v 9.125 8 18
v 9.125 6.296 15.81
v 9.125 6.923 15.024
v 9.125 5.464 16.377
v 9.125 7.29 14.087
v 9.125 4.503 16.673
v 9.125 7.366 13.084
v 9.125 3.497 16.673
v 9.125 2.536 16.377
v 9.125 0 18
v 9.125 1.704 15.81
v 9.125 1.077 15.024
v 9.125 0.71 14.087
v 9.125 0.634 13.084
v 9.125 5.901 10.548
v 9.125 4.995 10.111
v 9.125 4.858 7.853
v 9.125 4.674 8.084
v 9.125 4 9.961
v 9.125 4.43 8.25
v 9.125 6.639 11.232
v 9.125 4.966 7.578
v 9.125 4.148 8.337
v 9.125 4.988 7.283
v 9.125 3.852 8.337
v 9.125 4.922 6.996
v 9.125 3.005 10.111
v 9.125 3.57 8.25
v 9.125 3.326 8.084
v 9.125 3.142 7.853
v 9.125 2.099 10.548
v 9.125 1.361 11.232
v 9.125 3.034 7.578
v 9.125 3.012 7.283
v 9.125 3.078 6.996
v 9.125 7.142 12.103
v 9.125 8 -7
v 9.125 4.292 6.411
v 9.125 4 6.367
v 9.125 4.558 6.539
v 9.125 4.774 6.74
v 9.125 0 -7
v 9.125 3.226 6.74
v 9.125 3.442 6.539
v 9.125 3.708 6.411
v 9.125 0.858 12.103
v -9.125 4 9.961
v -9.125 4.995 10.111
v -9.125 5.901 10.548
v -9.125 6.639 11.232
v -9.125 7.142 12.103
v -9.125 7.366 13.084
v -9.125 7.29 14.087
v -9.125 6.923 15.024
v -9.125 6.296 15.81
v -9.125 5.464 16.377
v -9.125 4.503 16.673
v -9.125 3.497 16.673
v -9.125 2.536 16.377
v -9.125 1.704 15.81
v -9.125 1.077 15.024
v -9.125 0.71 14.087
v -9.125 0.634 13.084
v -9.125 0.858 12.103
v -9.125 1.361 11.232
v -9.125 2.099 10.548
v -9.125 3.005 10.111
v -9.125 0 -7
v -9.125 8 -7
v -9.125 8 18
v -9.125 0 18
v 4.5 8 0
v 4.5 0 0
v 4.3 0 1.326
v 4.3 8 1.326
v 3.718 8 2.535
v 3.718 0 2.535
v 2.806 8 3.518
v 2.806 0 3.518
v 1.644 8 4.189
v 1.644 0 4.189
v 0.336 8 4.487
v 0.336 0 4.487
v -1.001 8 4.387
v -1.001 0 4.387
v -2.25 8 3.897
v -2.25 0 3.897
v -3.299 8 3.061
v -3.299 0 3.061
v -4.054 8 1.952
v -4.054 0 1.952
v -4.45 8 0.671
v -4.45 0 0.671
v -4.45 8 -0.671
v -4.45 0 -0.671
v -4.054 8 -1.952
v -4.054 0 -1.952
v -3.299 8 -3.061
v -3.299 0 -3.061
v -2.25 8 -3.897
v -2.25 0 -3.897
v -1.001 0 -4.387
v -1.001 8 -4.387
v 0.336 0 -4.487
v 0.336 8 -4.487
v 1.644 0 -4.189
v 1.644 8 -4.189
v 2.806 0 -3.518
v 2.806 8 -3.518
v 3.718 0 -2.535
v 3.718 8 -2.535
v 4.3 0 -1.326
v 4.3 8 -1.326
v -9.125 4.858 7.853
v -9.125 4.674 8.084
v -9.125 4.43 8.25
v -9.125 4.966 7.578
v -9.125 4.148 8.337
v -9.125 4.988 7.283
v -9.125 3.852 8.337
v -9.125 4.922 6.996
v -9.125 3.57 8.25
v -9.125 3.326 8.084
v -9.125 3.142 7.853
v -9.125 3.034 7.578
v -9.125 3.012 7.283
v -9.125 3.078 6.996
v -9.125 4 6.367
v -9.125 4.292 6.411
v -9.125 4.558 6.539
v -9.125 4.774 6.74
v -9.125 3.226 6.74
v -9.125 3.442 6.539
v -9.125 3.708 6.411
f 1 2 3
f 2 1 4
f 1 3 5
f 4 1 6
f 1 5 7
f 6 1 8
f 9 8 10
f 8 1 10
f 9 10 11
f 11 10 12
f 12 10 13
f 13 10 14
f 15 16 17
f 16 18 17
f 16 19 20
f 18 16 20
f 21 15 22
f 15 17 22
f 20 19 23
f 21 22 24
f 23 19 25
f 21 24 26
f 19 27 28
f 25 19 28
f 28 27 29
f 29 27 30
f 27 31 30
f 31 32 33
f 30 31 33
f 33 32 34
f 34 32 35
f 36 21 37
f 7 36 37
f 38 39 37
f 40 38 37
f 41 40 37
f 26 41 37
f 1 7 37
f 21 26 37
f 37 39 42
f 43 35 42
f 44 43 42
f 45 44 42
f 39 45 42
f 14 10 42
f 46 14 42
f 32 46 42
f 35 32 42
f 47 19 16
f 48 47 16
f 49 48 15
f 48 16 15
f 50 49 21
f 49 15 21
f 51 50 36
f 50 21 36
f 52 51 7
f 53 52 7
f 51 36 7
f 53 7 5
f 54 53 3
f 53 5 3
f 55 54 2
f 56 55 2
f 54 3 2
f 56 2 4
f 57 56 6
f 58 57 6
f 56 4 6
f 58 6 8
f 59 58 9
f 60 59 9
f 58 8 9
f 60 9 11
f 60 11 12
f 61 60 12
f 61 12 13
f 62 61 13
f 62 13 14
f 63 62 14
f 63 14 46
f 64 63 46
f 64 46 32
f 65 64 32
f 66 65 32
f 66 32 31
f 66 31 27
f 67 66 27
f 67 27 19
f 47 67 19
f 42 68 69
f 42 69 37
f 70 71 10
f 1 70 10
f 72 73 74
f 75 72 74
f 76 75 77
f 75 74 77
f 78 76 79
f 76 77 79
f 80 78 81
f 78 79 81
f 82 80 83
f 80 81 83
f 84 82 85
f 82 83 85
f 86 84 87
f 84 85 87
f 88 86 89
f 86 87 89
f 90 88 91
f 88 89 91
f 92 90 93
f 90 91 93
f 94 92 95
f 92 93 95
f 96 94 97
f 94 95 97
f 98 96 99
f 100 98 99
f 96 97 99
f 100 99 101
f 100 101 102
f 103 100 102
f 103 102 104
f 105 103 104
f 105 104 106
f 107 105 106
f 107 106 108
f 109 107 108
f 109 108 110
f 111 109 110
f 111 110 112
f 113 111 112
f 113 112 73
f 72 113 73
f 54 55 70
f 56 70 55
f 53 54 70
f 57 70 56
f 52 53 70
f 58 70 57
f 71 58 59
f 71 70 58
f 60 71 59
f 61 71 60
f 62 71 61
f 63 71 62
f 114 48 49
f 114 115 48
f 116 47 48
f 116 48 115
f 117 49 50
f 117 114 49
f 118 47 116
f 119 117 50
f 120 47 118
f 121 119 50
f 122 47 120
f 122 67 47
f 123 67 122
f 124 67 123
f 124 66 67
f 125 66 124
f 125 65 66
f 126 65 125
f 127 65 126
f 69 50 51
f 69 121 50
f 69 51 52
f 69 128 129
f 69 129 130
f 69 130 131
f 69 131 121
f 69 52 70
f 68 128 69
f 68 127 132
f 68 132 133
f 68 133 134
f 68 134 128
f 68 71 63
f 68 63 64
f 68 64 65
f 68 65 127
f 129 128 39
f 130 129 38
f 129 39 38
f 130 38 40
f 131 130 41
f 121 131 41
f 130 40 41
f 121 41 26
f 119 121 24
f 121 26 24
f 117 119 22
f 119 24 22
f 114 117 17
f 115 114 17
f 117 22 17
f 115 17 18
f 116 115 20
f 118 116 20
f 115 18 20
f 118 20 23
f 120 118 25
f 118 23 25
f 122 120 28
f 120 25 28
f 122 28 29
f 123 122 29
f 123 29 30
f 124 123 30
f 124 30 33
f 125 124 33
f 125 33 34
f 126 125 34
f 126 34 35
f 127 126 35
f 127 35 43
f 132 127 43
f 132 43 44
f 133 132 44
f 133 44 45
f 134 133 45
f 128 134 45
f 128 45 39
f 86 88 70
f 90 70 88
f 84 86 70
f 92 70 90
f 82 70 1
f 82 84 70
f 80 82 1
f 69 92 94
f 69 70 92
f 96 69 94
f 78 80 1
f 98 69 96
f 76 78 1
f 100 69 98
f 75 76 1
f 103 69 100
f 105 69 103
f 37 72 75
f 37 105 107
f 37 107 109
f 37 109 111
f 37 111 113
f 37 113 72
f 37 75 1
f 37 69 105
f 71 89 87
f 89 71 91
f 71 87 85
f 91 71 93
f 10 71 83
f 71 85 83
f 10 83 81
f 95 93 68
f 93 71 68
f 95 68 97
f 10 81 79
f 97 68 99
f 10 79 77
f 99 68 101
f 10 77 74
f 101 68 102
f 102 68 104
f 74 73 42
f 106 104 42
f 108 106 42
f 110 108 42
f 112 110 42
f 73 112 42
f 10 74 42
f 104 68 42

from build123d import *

# Parameters (mm, degrees)
SKETCH1_W              = 18.25
SKETCH1_H              = 25
BOSS_EXTRUDE1_DEPTH    = 8
M10X1_0_TAPPED_HOLE1_D = 9
SKETCH7_R              = 3.375
SKETCH7_R_2            = 0.9906
CUT_EXTRUDE2_DEPTH     = 19.25


with BuildPart() as part:
    # Sketch1 → Boss-Extrude1 (new body)
    with BuildSketch(Plane(origin=(0, 0, 0), x_dir=(1, 0, 0), z_dir=(0, 1, 0))):
        with Locations((0, -5.5)):
            Rectangle(SKETCH1_W, SKETCH1_H)
    extrude(amount=BOSS_EXTRUDE1_DEPTH)

    # M10x1.0 Tapped Hole1 (through all)
    with Locations(Plane(origin=(0, 8, 0), x_dir=(-1, 0, 0), z_dir=(0, 1, 0))):
        with Locations((0, 0)):
            Hole(M10X1_0_TAPPED_HOLE1_D / 2)

    # Sketch7 → Cut-Extrude2 (cut, through all)
    with BuildSketch(Plane(origin=(9.125, 0, 0), x_dir=(0, 0, -1), z_dir=(1, 0, 0))):
        with Locations((-13.336186812, 4)):
            Circle(SKETCH7_R)
        with Locations((-7.3575, 4)):
            Circle(SKETCH7_R_2)
    extrude(amount=-CUT_EXTRUDE2_DEPTH, mode=Mode.SUBTRACT)


solid = part.part
